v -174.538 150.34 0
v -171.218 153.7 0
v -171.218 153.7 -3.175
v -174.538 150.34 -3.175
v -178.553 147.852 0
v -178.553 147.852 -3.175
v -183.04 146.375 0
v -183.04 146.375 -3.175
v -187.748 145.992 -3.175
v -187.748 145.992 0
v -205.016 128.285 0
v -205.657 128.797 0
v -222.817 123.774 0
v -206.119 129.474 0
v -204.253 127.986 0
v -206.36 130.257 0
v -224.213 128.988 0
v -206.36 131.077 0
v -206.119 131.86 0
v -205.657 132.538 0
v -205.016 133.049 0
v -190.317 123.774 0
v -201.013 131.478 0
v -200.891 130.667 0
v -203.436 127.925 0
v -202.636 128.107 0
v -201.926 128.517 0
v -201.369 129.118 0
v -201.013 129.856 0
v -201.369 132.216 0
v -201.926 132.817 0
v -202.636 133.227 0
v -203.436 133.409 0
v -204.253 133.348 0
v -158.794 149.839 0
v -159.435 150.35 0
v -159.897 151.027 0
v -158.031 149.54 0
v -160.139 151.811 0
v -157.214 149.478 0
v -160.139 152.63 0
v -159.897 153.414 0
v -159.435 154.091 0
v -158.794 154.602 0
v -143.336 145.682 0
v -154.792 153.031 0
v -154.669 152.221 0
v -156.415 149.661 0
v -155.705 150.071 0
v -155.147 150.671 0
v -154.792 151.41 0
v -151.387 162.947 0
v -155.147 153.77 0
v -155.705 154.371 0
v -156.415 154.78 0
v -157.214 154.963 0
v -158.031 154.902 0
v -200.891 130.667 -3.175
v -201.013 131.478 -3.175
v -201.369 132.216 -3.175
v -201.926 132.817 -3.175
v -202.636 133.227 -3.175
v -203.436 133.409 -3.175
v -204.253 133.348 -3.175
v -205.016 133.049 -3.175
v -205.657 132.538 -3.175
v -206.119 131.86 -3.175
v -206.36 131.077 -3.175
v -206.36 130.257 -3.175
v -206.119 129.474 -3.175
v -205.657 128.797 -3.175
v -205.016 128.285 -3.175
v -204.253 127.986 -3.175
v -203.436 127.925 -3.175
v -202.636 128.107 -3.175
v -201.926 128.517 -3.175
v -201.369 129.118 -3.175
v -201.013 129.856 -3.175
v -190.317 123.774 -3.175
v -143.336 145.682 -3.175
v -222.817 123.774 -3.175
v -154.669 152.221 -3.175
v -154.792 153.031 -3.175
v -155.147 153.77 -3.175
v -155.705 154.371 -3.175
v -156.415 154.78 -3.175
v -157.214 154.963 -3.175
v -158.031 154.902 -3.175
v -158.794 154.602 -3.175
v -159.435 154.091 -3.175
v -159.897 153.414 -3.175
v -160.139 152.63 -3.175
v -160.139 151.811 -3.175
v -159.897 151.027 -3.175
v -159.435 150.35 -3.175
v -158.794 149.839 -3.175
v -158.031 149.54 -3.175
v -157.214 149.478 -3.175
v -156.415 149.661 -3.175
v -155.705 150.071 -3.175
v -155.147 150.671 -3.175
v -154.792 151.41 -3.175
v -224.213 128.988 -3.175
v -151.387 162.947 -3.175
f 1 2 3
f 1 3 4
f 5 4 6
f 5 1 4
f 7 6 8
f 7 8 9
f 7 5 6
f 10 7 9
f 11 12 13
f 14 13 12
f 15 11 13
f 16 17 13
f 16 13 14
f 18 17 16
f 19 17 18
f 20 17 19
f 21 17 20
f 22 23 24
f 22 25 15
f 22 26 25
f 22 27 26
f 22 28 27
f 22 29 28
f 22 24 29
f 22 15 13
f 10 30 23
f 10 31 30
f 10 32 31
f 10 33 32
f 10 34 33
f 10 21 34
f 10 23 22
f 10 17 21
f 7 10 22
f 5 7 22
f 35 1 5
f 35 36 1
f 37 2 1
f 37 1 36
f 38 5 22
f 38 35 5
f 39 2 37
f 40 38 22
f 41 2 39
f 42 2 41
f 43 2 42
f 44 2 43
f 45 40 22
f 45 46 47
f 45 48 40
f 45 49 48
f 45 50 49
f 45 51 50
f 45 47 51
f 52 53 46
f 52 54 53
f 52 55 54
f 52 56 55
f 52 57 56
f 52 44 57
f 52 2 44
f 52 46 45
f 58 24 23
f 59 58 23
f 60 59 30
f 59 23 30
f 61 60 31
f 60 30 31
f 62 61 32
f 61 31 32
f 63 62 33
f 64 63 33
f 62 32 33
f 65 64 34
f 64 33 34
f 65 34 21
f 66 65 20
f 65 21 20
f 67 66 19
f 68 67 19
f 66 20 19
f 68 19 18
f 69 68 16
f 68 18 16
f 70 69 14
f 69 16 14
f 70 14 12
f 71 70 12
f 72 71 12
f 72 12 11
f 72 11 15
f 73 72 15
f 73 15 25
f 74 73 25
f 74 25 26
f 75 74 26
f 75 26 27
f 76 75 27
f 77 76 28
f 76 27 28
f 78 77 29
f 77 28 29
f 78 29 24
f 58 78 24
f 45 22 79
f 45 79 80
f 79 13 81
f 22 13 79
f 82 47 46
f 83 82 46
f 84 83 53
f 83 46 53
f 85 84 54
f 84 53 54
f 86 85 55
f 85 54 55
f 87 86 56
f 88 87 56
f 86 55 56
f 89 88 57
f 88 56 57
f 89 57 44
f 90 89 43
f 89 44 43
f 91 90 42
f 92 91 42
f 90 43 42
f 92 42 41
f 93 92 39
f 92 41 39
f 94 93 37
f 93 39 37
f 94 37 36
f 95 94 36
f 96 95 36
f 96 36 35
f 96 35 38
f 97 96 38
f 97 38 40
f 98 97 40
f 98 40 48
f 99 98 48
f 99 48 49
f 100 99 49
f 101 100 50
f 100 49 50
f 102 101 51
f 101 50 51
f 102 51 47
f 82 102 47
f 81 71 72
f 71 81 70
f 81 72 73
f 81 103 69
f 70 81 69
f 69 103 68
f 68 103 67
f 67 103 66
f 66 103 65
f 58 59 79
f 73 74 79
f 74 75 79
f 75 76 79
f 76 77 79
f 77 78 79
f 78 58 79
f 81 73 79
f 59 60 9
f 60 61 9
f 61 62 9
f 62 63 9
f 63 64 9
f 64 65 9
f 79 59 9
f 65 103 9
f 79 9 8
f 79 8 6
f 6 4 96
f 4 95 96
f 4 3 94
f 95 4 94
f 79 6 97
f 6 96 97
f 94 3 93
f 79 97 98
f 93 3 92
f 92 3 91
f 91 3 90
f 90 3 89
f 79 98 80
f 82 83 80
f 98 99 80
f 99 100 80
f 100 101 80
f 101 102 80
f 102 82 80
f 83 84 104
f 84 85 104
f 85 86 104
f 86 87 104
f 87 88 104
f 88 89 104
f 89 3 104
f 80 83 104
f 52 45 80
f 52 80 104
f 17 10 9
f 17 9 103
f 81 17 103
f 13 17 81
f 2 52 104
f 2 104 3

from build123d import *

# Parameters (mm, degrees)
SKETCH3_R           = 2.75
BOSS_EXTRUDE1_DEPTH = 3.175


with BuildPart() as part:
    # Sketch3 → Boss-Extrude1 (new body)
    with BuildSketch(Plane.XY):
        with BuildLine():
            Line((-151.387366014, 162.94696479), (-171.218095931, 153.699743563))
            ThreePointArc((-171.218095931, 153.699743563), (-178.553147236, 147.851921545), (-187.747718893, 145.99185379))
            Line((-187.747718893, 145.99185379), (-224.213491791, 128.987584627))
            Line((-224.213491791, 128.987584627), (-222.816572263, 123.774209976))
            Line((-222.816572263, 123.774209976), (-190.317469649, 123.774209976))
            Line((-190.317469649, 123.774209976), (-143.336488128, 145.681801447))
            Line((-143.336488128, 145.681801447), (-151.387366014, 162.94696479))
        make_face()
        with Locations((-157.41934736, 152.220574699)):
            Circle(SKETCH3_R, mode=Mode.SUBTRACT)
        with Locations((-203.641044499, 130.66704335)):
            Circle(SKETCH3_R, mode=Mode.SUBTRACT)
    extrude(amount=-BOSS_EXTRUDE1_DEPTH)


solid = part.part
